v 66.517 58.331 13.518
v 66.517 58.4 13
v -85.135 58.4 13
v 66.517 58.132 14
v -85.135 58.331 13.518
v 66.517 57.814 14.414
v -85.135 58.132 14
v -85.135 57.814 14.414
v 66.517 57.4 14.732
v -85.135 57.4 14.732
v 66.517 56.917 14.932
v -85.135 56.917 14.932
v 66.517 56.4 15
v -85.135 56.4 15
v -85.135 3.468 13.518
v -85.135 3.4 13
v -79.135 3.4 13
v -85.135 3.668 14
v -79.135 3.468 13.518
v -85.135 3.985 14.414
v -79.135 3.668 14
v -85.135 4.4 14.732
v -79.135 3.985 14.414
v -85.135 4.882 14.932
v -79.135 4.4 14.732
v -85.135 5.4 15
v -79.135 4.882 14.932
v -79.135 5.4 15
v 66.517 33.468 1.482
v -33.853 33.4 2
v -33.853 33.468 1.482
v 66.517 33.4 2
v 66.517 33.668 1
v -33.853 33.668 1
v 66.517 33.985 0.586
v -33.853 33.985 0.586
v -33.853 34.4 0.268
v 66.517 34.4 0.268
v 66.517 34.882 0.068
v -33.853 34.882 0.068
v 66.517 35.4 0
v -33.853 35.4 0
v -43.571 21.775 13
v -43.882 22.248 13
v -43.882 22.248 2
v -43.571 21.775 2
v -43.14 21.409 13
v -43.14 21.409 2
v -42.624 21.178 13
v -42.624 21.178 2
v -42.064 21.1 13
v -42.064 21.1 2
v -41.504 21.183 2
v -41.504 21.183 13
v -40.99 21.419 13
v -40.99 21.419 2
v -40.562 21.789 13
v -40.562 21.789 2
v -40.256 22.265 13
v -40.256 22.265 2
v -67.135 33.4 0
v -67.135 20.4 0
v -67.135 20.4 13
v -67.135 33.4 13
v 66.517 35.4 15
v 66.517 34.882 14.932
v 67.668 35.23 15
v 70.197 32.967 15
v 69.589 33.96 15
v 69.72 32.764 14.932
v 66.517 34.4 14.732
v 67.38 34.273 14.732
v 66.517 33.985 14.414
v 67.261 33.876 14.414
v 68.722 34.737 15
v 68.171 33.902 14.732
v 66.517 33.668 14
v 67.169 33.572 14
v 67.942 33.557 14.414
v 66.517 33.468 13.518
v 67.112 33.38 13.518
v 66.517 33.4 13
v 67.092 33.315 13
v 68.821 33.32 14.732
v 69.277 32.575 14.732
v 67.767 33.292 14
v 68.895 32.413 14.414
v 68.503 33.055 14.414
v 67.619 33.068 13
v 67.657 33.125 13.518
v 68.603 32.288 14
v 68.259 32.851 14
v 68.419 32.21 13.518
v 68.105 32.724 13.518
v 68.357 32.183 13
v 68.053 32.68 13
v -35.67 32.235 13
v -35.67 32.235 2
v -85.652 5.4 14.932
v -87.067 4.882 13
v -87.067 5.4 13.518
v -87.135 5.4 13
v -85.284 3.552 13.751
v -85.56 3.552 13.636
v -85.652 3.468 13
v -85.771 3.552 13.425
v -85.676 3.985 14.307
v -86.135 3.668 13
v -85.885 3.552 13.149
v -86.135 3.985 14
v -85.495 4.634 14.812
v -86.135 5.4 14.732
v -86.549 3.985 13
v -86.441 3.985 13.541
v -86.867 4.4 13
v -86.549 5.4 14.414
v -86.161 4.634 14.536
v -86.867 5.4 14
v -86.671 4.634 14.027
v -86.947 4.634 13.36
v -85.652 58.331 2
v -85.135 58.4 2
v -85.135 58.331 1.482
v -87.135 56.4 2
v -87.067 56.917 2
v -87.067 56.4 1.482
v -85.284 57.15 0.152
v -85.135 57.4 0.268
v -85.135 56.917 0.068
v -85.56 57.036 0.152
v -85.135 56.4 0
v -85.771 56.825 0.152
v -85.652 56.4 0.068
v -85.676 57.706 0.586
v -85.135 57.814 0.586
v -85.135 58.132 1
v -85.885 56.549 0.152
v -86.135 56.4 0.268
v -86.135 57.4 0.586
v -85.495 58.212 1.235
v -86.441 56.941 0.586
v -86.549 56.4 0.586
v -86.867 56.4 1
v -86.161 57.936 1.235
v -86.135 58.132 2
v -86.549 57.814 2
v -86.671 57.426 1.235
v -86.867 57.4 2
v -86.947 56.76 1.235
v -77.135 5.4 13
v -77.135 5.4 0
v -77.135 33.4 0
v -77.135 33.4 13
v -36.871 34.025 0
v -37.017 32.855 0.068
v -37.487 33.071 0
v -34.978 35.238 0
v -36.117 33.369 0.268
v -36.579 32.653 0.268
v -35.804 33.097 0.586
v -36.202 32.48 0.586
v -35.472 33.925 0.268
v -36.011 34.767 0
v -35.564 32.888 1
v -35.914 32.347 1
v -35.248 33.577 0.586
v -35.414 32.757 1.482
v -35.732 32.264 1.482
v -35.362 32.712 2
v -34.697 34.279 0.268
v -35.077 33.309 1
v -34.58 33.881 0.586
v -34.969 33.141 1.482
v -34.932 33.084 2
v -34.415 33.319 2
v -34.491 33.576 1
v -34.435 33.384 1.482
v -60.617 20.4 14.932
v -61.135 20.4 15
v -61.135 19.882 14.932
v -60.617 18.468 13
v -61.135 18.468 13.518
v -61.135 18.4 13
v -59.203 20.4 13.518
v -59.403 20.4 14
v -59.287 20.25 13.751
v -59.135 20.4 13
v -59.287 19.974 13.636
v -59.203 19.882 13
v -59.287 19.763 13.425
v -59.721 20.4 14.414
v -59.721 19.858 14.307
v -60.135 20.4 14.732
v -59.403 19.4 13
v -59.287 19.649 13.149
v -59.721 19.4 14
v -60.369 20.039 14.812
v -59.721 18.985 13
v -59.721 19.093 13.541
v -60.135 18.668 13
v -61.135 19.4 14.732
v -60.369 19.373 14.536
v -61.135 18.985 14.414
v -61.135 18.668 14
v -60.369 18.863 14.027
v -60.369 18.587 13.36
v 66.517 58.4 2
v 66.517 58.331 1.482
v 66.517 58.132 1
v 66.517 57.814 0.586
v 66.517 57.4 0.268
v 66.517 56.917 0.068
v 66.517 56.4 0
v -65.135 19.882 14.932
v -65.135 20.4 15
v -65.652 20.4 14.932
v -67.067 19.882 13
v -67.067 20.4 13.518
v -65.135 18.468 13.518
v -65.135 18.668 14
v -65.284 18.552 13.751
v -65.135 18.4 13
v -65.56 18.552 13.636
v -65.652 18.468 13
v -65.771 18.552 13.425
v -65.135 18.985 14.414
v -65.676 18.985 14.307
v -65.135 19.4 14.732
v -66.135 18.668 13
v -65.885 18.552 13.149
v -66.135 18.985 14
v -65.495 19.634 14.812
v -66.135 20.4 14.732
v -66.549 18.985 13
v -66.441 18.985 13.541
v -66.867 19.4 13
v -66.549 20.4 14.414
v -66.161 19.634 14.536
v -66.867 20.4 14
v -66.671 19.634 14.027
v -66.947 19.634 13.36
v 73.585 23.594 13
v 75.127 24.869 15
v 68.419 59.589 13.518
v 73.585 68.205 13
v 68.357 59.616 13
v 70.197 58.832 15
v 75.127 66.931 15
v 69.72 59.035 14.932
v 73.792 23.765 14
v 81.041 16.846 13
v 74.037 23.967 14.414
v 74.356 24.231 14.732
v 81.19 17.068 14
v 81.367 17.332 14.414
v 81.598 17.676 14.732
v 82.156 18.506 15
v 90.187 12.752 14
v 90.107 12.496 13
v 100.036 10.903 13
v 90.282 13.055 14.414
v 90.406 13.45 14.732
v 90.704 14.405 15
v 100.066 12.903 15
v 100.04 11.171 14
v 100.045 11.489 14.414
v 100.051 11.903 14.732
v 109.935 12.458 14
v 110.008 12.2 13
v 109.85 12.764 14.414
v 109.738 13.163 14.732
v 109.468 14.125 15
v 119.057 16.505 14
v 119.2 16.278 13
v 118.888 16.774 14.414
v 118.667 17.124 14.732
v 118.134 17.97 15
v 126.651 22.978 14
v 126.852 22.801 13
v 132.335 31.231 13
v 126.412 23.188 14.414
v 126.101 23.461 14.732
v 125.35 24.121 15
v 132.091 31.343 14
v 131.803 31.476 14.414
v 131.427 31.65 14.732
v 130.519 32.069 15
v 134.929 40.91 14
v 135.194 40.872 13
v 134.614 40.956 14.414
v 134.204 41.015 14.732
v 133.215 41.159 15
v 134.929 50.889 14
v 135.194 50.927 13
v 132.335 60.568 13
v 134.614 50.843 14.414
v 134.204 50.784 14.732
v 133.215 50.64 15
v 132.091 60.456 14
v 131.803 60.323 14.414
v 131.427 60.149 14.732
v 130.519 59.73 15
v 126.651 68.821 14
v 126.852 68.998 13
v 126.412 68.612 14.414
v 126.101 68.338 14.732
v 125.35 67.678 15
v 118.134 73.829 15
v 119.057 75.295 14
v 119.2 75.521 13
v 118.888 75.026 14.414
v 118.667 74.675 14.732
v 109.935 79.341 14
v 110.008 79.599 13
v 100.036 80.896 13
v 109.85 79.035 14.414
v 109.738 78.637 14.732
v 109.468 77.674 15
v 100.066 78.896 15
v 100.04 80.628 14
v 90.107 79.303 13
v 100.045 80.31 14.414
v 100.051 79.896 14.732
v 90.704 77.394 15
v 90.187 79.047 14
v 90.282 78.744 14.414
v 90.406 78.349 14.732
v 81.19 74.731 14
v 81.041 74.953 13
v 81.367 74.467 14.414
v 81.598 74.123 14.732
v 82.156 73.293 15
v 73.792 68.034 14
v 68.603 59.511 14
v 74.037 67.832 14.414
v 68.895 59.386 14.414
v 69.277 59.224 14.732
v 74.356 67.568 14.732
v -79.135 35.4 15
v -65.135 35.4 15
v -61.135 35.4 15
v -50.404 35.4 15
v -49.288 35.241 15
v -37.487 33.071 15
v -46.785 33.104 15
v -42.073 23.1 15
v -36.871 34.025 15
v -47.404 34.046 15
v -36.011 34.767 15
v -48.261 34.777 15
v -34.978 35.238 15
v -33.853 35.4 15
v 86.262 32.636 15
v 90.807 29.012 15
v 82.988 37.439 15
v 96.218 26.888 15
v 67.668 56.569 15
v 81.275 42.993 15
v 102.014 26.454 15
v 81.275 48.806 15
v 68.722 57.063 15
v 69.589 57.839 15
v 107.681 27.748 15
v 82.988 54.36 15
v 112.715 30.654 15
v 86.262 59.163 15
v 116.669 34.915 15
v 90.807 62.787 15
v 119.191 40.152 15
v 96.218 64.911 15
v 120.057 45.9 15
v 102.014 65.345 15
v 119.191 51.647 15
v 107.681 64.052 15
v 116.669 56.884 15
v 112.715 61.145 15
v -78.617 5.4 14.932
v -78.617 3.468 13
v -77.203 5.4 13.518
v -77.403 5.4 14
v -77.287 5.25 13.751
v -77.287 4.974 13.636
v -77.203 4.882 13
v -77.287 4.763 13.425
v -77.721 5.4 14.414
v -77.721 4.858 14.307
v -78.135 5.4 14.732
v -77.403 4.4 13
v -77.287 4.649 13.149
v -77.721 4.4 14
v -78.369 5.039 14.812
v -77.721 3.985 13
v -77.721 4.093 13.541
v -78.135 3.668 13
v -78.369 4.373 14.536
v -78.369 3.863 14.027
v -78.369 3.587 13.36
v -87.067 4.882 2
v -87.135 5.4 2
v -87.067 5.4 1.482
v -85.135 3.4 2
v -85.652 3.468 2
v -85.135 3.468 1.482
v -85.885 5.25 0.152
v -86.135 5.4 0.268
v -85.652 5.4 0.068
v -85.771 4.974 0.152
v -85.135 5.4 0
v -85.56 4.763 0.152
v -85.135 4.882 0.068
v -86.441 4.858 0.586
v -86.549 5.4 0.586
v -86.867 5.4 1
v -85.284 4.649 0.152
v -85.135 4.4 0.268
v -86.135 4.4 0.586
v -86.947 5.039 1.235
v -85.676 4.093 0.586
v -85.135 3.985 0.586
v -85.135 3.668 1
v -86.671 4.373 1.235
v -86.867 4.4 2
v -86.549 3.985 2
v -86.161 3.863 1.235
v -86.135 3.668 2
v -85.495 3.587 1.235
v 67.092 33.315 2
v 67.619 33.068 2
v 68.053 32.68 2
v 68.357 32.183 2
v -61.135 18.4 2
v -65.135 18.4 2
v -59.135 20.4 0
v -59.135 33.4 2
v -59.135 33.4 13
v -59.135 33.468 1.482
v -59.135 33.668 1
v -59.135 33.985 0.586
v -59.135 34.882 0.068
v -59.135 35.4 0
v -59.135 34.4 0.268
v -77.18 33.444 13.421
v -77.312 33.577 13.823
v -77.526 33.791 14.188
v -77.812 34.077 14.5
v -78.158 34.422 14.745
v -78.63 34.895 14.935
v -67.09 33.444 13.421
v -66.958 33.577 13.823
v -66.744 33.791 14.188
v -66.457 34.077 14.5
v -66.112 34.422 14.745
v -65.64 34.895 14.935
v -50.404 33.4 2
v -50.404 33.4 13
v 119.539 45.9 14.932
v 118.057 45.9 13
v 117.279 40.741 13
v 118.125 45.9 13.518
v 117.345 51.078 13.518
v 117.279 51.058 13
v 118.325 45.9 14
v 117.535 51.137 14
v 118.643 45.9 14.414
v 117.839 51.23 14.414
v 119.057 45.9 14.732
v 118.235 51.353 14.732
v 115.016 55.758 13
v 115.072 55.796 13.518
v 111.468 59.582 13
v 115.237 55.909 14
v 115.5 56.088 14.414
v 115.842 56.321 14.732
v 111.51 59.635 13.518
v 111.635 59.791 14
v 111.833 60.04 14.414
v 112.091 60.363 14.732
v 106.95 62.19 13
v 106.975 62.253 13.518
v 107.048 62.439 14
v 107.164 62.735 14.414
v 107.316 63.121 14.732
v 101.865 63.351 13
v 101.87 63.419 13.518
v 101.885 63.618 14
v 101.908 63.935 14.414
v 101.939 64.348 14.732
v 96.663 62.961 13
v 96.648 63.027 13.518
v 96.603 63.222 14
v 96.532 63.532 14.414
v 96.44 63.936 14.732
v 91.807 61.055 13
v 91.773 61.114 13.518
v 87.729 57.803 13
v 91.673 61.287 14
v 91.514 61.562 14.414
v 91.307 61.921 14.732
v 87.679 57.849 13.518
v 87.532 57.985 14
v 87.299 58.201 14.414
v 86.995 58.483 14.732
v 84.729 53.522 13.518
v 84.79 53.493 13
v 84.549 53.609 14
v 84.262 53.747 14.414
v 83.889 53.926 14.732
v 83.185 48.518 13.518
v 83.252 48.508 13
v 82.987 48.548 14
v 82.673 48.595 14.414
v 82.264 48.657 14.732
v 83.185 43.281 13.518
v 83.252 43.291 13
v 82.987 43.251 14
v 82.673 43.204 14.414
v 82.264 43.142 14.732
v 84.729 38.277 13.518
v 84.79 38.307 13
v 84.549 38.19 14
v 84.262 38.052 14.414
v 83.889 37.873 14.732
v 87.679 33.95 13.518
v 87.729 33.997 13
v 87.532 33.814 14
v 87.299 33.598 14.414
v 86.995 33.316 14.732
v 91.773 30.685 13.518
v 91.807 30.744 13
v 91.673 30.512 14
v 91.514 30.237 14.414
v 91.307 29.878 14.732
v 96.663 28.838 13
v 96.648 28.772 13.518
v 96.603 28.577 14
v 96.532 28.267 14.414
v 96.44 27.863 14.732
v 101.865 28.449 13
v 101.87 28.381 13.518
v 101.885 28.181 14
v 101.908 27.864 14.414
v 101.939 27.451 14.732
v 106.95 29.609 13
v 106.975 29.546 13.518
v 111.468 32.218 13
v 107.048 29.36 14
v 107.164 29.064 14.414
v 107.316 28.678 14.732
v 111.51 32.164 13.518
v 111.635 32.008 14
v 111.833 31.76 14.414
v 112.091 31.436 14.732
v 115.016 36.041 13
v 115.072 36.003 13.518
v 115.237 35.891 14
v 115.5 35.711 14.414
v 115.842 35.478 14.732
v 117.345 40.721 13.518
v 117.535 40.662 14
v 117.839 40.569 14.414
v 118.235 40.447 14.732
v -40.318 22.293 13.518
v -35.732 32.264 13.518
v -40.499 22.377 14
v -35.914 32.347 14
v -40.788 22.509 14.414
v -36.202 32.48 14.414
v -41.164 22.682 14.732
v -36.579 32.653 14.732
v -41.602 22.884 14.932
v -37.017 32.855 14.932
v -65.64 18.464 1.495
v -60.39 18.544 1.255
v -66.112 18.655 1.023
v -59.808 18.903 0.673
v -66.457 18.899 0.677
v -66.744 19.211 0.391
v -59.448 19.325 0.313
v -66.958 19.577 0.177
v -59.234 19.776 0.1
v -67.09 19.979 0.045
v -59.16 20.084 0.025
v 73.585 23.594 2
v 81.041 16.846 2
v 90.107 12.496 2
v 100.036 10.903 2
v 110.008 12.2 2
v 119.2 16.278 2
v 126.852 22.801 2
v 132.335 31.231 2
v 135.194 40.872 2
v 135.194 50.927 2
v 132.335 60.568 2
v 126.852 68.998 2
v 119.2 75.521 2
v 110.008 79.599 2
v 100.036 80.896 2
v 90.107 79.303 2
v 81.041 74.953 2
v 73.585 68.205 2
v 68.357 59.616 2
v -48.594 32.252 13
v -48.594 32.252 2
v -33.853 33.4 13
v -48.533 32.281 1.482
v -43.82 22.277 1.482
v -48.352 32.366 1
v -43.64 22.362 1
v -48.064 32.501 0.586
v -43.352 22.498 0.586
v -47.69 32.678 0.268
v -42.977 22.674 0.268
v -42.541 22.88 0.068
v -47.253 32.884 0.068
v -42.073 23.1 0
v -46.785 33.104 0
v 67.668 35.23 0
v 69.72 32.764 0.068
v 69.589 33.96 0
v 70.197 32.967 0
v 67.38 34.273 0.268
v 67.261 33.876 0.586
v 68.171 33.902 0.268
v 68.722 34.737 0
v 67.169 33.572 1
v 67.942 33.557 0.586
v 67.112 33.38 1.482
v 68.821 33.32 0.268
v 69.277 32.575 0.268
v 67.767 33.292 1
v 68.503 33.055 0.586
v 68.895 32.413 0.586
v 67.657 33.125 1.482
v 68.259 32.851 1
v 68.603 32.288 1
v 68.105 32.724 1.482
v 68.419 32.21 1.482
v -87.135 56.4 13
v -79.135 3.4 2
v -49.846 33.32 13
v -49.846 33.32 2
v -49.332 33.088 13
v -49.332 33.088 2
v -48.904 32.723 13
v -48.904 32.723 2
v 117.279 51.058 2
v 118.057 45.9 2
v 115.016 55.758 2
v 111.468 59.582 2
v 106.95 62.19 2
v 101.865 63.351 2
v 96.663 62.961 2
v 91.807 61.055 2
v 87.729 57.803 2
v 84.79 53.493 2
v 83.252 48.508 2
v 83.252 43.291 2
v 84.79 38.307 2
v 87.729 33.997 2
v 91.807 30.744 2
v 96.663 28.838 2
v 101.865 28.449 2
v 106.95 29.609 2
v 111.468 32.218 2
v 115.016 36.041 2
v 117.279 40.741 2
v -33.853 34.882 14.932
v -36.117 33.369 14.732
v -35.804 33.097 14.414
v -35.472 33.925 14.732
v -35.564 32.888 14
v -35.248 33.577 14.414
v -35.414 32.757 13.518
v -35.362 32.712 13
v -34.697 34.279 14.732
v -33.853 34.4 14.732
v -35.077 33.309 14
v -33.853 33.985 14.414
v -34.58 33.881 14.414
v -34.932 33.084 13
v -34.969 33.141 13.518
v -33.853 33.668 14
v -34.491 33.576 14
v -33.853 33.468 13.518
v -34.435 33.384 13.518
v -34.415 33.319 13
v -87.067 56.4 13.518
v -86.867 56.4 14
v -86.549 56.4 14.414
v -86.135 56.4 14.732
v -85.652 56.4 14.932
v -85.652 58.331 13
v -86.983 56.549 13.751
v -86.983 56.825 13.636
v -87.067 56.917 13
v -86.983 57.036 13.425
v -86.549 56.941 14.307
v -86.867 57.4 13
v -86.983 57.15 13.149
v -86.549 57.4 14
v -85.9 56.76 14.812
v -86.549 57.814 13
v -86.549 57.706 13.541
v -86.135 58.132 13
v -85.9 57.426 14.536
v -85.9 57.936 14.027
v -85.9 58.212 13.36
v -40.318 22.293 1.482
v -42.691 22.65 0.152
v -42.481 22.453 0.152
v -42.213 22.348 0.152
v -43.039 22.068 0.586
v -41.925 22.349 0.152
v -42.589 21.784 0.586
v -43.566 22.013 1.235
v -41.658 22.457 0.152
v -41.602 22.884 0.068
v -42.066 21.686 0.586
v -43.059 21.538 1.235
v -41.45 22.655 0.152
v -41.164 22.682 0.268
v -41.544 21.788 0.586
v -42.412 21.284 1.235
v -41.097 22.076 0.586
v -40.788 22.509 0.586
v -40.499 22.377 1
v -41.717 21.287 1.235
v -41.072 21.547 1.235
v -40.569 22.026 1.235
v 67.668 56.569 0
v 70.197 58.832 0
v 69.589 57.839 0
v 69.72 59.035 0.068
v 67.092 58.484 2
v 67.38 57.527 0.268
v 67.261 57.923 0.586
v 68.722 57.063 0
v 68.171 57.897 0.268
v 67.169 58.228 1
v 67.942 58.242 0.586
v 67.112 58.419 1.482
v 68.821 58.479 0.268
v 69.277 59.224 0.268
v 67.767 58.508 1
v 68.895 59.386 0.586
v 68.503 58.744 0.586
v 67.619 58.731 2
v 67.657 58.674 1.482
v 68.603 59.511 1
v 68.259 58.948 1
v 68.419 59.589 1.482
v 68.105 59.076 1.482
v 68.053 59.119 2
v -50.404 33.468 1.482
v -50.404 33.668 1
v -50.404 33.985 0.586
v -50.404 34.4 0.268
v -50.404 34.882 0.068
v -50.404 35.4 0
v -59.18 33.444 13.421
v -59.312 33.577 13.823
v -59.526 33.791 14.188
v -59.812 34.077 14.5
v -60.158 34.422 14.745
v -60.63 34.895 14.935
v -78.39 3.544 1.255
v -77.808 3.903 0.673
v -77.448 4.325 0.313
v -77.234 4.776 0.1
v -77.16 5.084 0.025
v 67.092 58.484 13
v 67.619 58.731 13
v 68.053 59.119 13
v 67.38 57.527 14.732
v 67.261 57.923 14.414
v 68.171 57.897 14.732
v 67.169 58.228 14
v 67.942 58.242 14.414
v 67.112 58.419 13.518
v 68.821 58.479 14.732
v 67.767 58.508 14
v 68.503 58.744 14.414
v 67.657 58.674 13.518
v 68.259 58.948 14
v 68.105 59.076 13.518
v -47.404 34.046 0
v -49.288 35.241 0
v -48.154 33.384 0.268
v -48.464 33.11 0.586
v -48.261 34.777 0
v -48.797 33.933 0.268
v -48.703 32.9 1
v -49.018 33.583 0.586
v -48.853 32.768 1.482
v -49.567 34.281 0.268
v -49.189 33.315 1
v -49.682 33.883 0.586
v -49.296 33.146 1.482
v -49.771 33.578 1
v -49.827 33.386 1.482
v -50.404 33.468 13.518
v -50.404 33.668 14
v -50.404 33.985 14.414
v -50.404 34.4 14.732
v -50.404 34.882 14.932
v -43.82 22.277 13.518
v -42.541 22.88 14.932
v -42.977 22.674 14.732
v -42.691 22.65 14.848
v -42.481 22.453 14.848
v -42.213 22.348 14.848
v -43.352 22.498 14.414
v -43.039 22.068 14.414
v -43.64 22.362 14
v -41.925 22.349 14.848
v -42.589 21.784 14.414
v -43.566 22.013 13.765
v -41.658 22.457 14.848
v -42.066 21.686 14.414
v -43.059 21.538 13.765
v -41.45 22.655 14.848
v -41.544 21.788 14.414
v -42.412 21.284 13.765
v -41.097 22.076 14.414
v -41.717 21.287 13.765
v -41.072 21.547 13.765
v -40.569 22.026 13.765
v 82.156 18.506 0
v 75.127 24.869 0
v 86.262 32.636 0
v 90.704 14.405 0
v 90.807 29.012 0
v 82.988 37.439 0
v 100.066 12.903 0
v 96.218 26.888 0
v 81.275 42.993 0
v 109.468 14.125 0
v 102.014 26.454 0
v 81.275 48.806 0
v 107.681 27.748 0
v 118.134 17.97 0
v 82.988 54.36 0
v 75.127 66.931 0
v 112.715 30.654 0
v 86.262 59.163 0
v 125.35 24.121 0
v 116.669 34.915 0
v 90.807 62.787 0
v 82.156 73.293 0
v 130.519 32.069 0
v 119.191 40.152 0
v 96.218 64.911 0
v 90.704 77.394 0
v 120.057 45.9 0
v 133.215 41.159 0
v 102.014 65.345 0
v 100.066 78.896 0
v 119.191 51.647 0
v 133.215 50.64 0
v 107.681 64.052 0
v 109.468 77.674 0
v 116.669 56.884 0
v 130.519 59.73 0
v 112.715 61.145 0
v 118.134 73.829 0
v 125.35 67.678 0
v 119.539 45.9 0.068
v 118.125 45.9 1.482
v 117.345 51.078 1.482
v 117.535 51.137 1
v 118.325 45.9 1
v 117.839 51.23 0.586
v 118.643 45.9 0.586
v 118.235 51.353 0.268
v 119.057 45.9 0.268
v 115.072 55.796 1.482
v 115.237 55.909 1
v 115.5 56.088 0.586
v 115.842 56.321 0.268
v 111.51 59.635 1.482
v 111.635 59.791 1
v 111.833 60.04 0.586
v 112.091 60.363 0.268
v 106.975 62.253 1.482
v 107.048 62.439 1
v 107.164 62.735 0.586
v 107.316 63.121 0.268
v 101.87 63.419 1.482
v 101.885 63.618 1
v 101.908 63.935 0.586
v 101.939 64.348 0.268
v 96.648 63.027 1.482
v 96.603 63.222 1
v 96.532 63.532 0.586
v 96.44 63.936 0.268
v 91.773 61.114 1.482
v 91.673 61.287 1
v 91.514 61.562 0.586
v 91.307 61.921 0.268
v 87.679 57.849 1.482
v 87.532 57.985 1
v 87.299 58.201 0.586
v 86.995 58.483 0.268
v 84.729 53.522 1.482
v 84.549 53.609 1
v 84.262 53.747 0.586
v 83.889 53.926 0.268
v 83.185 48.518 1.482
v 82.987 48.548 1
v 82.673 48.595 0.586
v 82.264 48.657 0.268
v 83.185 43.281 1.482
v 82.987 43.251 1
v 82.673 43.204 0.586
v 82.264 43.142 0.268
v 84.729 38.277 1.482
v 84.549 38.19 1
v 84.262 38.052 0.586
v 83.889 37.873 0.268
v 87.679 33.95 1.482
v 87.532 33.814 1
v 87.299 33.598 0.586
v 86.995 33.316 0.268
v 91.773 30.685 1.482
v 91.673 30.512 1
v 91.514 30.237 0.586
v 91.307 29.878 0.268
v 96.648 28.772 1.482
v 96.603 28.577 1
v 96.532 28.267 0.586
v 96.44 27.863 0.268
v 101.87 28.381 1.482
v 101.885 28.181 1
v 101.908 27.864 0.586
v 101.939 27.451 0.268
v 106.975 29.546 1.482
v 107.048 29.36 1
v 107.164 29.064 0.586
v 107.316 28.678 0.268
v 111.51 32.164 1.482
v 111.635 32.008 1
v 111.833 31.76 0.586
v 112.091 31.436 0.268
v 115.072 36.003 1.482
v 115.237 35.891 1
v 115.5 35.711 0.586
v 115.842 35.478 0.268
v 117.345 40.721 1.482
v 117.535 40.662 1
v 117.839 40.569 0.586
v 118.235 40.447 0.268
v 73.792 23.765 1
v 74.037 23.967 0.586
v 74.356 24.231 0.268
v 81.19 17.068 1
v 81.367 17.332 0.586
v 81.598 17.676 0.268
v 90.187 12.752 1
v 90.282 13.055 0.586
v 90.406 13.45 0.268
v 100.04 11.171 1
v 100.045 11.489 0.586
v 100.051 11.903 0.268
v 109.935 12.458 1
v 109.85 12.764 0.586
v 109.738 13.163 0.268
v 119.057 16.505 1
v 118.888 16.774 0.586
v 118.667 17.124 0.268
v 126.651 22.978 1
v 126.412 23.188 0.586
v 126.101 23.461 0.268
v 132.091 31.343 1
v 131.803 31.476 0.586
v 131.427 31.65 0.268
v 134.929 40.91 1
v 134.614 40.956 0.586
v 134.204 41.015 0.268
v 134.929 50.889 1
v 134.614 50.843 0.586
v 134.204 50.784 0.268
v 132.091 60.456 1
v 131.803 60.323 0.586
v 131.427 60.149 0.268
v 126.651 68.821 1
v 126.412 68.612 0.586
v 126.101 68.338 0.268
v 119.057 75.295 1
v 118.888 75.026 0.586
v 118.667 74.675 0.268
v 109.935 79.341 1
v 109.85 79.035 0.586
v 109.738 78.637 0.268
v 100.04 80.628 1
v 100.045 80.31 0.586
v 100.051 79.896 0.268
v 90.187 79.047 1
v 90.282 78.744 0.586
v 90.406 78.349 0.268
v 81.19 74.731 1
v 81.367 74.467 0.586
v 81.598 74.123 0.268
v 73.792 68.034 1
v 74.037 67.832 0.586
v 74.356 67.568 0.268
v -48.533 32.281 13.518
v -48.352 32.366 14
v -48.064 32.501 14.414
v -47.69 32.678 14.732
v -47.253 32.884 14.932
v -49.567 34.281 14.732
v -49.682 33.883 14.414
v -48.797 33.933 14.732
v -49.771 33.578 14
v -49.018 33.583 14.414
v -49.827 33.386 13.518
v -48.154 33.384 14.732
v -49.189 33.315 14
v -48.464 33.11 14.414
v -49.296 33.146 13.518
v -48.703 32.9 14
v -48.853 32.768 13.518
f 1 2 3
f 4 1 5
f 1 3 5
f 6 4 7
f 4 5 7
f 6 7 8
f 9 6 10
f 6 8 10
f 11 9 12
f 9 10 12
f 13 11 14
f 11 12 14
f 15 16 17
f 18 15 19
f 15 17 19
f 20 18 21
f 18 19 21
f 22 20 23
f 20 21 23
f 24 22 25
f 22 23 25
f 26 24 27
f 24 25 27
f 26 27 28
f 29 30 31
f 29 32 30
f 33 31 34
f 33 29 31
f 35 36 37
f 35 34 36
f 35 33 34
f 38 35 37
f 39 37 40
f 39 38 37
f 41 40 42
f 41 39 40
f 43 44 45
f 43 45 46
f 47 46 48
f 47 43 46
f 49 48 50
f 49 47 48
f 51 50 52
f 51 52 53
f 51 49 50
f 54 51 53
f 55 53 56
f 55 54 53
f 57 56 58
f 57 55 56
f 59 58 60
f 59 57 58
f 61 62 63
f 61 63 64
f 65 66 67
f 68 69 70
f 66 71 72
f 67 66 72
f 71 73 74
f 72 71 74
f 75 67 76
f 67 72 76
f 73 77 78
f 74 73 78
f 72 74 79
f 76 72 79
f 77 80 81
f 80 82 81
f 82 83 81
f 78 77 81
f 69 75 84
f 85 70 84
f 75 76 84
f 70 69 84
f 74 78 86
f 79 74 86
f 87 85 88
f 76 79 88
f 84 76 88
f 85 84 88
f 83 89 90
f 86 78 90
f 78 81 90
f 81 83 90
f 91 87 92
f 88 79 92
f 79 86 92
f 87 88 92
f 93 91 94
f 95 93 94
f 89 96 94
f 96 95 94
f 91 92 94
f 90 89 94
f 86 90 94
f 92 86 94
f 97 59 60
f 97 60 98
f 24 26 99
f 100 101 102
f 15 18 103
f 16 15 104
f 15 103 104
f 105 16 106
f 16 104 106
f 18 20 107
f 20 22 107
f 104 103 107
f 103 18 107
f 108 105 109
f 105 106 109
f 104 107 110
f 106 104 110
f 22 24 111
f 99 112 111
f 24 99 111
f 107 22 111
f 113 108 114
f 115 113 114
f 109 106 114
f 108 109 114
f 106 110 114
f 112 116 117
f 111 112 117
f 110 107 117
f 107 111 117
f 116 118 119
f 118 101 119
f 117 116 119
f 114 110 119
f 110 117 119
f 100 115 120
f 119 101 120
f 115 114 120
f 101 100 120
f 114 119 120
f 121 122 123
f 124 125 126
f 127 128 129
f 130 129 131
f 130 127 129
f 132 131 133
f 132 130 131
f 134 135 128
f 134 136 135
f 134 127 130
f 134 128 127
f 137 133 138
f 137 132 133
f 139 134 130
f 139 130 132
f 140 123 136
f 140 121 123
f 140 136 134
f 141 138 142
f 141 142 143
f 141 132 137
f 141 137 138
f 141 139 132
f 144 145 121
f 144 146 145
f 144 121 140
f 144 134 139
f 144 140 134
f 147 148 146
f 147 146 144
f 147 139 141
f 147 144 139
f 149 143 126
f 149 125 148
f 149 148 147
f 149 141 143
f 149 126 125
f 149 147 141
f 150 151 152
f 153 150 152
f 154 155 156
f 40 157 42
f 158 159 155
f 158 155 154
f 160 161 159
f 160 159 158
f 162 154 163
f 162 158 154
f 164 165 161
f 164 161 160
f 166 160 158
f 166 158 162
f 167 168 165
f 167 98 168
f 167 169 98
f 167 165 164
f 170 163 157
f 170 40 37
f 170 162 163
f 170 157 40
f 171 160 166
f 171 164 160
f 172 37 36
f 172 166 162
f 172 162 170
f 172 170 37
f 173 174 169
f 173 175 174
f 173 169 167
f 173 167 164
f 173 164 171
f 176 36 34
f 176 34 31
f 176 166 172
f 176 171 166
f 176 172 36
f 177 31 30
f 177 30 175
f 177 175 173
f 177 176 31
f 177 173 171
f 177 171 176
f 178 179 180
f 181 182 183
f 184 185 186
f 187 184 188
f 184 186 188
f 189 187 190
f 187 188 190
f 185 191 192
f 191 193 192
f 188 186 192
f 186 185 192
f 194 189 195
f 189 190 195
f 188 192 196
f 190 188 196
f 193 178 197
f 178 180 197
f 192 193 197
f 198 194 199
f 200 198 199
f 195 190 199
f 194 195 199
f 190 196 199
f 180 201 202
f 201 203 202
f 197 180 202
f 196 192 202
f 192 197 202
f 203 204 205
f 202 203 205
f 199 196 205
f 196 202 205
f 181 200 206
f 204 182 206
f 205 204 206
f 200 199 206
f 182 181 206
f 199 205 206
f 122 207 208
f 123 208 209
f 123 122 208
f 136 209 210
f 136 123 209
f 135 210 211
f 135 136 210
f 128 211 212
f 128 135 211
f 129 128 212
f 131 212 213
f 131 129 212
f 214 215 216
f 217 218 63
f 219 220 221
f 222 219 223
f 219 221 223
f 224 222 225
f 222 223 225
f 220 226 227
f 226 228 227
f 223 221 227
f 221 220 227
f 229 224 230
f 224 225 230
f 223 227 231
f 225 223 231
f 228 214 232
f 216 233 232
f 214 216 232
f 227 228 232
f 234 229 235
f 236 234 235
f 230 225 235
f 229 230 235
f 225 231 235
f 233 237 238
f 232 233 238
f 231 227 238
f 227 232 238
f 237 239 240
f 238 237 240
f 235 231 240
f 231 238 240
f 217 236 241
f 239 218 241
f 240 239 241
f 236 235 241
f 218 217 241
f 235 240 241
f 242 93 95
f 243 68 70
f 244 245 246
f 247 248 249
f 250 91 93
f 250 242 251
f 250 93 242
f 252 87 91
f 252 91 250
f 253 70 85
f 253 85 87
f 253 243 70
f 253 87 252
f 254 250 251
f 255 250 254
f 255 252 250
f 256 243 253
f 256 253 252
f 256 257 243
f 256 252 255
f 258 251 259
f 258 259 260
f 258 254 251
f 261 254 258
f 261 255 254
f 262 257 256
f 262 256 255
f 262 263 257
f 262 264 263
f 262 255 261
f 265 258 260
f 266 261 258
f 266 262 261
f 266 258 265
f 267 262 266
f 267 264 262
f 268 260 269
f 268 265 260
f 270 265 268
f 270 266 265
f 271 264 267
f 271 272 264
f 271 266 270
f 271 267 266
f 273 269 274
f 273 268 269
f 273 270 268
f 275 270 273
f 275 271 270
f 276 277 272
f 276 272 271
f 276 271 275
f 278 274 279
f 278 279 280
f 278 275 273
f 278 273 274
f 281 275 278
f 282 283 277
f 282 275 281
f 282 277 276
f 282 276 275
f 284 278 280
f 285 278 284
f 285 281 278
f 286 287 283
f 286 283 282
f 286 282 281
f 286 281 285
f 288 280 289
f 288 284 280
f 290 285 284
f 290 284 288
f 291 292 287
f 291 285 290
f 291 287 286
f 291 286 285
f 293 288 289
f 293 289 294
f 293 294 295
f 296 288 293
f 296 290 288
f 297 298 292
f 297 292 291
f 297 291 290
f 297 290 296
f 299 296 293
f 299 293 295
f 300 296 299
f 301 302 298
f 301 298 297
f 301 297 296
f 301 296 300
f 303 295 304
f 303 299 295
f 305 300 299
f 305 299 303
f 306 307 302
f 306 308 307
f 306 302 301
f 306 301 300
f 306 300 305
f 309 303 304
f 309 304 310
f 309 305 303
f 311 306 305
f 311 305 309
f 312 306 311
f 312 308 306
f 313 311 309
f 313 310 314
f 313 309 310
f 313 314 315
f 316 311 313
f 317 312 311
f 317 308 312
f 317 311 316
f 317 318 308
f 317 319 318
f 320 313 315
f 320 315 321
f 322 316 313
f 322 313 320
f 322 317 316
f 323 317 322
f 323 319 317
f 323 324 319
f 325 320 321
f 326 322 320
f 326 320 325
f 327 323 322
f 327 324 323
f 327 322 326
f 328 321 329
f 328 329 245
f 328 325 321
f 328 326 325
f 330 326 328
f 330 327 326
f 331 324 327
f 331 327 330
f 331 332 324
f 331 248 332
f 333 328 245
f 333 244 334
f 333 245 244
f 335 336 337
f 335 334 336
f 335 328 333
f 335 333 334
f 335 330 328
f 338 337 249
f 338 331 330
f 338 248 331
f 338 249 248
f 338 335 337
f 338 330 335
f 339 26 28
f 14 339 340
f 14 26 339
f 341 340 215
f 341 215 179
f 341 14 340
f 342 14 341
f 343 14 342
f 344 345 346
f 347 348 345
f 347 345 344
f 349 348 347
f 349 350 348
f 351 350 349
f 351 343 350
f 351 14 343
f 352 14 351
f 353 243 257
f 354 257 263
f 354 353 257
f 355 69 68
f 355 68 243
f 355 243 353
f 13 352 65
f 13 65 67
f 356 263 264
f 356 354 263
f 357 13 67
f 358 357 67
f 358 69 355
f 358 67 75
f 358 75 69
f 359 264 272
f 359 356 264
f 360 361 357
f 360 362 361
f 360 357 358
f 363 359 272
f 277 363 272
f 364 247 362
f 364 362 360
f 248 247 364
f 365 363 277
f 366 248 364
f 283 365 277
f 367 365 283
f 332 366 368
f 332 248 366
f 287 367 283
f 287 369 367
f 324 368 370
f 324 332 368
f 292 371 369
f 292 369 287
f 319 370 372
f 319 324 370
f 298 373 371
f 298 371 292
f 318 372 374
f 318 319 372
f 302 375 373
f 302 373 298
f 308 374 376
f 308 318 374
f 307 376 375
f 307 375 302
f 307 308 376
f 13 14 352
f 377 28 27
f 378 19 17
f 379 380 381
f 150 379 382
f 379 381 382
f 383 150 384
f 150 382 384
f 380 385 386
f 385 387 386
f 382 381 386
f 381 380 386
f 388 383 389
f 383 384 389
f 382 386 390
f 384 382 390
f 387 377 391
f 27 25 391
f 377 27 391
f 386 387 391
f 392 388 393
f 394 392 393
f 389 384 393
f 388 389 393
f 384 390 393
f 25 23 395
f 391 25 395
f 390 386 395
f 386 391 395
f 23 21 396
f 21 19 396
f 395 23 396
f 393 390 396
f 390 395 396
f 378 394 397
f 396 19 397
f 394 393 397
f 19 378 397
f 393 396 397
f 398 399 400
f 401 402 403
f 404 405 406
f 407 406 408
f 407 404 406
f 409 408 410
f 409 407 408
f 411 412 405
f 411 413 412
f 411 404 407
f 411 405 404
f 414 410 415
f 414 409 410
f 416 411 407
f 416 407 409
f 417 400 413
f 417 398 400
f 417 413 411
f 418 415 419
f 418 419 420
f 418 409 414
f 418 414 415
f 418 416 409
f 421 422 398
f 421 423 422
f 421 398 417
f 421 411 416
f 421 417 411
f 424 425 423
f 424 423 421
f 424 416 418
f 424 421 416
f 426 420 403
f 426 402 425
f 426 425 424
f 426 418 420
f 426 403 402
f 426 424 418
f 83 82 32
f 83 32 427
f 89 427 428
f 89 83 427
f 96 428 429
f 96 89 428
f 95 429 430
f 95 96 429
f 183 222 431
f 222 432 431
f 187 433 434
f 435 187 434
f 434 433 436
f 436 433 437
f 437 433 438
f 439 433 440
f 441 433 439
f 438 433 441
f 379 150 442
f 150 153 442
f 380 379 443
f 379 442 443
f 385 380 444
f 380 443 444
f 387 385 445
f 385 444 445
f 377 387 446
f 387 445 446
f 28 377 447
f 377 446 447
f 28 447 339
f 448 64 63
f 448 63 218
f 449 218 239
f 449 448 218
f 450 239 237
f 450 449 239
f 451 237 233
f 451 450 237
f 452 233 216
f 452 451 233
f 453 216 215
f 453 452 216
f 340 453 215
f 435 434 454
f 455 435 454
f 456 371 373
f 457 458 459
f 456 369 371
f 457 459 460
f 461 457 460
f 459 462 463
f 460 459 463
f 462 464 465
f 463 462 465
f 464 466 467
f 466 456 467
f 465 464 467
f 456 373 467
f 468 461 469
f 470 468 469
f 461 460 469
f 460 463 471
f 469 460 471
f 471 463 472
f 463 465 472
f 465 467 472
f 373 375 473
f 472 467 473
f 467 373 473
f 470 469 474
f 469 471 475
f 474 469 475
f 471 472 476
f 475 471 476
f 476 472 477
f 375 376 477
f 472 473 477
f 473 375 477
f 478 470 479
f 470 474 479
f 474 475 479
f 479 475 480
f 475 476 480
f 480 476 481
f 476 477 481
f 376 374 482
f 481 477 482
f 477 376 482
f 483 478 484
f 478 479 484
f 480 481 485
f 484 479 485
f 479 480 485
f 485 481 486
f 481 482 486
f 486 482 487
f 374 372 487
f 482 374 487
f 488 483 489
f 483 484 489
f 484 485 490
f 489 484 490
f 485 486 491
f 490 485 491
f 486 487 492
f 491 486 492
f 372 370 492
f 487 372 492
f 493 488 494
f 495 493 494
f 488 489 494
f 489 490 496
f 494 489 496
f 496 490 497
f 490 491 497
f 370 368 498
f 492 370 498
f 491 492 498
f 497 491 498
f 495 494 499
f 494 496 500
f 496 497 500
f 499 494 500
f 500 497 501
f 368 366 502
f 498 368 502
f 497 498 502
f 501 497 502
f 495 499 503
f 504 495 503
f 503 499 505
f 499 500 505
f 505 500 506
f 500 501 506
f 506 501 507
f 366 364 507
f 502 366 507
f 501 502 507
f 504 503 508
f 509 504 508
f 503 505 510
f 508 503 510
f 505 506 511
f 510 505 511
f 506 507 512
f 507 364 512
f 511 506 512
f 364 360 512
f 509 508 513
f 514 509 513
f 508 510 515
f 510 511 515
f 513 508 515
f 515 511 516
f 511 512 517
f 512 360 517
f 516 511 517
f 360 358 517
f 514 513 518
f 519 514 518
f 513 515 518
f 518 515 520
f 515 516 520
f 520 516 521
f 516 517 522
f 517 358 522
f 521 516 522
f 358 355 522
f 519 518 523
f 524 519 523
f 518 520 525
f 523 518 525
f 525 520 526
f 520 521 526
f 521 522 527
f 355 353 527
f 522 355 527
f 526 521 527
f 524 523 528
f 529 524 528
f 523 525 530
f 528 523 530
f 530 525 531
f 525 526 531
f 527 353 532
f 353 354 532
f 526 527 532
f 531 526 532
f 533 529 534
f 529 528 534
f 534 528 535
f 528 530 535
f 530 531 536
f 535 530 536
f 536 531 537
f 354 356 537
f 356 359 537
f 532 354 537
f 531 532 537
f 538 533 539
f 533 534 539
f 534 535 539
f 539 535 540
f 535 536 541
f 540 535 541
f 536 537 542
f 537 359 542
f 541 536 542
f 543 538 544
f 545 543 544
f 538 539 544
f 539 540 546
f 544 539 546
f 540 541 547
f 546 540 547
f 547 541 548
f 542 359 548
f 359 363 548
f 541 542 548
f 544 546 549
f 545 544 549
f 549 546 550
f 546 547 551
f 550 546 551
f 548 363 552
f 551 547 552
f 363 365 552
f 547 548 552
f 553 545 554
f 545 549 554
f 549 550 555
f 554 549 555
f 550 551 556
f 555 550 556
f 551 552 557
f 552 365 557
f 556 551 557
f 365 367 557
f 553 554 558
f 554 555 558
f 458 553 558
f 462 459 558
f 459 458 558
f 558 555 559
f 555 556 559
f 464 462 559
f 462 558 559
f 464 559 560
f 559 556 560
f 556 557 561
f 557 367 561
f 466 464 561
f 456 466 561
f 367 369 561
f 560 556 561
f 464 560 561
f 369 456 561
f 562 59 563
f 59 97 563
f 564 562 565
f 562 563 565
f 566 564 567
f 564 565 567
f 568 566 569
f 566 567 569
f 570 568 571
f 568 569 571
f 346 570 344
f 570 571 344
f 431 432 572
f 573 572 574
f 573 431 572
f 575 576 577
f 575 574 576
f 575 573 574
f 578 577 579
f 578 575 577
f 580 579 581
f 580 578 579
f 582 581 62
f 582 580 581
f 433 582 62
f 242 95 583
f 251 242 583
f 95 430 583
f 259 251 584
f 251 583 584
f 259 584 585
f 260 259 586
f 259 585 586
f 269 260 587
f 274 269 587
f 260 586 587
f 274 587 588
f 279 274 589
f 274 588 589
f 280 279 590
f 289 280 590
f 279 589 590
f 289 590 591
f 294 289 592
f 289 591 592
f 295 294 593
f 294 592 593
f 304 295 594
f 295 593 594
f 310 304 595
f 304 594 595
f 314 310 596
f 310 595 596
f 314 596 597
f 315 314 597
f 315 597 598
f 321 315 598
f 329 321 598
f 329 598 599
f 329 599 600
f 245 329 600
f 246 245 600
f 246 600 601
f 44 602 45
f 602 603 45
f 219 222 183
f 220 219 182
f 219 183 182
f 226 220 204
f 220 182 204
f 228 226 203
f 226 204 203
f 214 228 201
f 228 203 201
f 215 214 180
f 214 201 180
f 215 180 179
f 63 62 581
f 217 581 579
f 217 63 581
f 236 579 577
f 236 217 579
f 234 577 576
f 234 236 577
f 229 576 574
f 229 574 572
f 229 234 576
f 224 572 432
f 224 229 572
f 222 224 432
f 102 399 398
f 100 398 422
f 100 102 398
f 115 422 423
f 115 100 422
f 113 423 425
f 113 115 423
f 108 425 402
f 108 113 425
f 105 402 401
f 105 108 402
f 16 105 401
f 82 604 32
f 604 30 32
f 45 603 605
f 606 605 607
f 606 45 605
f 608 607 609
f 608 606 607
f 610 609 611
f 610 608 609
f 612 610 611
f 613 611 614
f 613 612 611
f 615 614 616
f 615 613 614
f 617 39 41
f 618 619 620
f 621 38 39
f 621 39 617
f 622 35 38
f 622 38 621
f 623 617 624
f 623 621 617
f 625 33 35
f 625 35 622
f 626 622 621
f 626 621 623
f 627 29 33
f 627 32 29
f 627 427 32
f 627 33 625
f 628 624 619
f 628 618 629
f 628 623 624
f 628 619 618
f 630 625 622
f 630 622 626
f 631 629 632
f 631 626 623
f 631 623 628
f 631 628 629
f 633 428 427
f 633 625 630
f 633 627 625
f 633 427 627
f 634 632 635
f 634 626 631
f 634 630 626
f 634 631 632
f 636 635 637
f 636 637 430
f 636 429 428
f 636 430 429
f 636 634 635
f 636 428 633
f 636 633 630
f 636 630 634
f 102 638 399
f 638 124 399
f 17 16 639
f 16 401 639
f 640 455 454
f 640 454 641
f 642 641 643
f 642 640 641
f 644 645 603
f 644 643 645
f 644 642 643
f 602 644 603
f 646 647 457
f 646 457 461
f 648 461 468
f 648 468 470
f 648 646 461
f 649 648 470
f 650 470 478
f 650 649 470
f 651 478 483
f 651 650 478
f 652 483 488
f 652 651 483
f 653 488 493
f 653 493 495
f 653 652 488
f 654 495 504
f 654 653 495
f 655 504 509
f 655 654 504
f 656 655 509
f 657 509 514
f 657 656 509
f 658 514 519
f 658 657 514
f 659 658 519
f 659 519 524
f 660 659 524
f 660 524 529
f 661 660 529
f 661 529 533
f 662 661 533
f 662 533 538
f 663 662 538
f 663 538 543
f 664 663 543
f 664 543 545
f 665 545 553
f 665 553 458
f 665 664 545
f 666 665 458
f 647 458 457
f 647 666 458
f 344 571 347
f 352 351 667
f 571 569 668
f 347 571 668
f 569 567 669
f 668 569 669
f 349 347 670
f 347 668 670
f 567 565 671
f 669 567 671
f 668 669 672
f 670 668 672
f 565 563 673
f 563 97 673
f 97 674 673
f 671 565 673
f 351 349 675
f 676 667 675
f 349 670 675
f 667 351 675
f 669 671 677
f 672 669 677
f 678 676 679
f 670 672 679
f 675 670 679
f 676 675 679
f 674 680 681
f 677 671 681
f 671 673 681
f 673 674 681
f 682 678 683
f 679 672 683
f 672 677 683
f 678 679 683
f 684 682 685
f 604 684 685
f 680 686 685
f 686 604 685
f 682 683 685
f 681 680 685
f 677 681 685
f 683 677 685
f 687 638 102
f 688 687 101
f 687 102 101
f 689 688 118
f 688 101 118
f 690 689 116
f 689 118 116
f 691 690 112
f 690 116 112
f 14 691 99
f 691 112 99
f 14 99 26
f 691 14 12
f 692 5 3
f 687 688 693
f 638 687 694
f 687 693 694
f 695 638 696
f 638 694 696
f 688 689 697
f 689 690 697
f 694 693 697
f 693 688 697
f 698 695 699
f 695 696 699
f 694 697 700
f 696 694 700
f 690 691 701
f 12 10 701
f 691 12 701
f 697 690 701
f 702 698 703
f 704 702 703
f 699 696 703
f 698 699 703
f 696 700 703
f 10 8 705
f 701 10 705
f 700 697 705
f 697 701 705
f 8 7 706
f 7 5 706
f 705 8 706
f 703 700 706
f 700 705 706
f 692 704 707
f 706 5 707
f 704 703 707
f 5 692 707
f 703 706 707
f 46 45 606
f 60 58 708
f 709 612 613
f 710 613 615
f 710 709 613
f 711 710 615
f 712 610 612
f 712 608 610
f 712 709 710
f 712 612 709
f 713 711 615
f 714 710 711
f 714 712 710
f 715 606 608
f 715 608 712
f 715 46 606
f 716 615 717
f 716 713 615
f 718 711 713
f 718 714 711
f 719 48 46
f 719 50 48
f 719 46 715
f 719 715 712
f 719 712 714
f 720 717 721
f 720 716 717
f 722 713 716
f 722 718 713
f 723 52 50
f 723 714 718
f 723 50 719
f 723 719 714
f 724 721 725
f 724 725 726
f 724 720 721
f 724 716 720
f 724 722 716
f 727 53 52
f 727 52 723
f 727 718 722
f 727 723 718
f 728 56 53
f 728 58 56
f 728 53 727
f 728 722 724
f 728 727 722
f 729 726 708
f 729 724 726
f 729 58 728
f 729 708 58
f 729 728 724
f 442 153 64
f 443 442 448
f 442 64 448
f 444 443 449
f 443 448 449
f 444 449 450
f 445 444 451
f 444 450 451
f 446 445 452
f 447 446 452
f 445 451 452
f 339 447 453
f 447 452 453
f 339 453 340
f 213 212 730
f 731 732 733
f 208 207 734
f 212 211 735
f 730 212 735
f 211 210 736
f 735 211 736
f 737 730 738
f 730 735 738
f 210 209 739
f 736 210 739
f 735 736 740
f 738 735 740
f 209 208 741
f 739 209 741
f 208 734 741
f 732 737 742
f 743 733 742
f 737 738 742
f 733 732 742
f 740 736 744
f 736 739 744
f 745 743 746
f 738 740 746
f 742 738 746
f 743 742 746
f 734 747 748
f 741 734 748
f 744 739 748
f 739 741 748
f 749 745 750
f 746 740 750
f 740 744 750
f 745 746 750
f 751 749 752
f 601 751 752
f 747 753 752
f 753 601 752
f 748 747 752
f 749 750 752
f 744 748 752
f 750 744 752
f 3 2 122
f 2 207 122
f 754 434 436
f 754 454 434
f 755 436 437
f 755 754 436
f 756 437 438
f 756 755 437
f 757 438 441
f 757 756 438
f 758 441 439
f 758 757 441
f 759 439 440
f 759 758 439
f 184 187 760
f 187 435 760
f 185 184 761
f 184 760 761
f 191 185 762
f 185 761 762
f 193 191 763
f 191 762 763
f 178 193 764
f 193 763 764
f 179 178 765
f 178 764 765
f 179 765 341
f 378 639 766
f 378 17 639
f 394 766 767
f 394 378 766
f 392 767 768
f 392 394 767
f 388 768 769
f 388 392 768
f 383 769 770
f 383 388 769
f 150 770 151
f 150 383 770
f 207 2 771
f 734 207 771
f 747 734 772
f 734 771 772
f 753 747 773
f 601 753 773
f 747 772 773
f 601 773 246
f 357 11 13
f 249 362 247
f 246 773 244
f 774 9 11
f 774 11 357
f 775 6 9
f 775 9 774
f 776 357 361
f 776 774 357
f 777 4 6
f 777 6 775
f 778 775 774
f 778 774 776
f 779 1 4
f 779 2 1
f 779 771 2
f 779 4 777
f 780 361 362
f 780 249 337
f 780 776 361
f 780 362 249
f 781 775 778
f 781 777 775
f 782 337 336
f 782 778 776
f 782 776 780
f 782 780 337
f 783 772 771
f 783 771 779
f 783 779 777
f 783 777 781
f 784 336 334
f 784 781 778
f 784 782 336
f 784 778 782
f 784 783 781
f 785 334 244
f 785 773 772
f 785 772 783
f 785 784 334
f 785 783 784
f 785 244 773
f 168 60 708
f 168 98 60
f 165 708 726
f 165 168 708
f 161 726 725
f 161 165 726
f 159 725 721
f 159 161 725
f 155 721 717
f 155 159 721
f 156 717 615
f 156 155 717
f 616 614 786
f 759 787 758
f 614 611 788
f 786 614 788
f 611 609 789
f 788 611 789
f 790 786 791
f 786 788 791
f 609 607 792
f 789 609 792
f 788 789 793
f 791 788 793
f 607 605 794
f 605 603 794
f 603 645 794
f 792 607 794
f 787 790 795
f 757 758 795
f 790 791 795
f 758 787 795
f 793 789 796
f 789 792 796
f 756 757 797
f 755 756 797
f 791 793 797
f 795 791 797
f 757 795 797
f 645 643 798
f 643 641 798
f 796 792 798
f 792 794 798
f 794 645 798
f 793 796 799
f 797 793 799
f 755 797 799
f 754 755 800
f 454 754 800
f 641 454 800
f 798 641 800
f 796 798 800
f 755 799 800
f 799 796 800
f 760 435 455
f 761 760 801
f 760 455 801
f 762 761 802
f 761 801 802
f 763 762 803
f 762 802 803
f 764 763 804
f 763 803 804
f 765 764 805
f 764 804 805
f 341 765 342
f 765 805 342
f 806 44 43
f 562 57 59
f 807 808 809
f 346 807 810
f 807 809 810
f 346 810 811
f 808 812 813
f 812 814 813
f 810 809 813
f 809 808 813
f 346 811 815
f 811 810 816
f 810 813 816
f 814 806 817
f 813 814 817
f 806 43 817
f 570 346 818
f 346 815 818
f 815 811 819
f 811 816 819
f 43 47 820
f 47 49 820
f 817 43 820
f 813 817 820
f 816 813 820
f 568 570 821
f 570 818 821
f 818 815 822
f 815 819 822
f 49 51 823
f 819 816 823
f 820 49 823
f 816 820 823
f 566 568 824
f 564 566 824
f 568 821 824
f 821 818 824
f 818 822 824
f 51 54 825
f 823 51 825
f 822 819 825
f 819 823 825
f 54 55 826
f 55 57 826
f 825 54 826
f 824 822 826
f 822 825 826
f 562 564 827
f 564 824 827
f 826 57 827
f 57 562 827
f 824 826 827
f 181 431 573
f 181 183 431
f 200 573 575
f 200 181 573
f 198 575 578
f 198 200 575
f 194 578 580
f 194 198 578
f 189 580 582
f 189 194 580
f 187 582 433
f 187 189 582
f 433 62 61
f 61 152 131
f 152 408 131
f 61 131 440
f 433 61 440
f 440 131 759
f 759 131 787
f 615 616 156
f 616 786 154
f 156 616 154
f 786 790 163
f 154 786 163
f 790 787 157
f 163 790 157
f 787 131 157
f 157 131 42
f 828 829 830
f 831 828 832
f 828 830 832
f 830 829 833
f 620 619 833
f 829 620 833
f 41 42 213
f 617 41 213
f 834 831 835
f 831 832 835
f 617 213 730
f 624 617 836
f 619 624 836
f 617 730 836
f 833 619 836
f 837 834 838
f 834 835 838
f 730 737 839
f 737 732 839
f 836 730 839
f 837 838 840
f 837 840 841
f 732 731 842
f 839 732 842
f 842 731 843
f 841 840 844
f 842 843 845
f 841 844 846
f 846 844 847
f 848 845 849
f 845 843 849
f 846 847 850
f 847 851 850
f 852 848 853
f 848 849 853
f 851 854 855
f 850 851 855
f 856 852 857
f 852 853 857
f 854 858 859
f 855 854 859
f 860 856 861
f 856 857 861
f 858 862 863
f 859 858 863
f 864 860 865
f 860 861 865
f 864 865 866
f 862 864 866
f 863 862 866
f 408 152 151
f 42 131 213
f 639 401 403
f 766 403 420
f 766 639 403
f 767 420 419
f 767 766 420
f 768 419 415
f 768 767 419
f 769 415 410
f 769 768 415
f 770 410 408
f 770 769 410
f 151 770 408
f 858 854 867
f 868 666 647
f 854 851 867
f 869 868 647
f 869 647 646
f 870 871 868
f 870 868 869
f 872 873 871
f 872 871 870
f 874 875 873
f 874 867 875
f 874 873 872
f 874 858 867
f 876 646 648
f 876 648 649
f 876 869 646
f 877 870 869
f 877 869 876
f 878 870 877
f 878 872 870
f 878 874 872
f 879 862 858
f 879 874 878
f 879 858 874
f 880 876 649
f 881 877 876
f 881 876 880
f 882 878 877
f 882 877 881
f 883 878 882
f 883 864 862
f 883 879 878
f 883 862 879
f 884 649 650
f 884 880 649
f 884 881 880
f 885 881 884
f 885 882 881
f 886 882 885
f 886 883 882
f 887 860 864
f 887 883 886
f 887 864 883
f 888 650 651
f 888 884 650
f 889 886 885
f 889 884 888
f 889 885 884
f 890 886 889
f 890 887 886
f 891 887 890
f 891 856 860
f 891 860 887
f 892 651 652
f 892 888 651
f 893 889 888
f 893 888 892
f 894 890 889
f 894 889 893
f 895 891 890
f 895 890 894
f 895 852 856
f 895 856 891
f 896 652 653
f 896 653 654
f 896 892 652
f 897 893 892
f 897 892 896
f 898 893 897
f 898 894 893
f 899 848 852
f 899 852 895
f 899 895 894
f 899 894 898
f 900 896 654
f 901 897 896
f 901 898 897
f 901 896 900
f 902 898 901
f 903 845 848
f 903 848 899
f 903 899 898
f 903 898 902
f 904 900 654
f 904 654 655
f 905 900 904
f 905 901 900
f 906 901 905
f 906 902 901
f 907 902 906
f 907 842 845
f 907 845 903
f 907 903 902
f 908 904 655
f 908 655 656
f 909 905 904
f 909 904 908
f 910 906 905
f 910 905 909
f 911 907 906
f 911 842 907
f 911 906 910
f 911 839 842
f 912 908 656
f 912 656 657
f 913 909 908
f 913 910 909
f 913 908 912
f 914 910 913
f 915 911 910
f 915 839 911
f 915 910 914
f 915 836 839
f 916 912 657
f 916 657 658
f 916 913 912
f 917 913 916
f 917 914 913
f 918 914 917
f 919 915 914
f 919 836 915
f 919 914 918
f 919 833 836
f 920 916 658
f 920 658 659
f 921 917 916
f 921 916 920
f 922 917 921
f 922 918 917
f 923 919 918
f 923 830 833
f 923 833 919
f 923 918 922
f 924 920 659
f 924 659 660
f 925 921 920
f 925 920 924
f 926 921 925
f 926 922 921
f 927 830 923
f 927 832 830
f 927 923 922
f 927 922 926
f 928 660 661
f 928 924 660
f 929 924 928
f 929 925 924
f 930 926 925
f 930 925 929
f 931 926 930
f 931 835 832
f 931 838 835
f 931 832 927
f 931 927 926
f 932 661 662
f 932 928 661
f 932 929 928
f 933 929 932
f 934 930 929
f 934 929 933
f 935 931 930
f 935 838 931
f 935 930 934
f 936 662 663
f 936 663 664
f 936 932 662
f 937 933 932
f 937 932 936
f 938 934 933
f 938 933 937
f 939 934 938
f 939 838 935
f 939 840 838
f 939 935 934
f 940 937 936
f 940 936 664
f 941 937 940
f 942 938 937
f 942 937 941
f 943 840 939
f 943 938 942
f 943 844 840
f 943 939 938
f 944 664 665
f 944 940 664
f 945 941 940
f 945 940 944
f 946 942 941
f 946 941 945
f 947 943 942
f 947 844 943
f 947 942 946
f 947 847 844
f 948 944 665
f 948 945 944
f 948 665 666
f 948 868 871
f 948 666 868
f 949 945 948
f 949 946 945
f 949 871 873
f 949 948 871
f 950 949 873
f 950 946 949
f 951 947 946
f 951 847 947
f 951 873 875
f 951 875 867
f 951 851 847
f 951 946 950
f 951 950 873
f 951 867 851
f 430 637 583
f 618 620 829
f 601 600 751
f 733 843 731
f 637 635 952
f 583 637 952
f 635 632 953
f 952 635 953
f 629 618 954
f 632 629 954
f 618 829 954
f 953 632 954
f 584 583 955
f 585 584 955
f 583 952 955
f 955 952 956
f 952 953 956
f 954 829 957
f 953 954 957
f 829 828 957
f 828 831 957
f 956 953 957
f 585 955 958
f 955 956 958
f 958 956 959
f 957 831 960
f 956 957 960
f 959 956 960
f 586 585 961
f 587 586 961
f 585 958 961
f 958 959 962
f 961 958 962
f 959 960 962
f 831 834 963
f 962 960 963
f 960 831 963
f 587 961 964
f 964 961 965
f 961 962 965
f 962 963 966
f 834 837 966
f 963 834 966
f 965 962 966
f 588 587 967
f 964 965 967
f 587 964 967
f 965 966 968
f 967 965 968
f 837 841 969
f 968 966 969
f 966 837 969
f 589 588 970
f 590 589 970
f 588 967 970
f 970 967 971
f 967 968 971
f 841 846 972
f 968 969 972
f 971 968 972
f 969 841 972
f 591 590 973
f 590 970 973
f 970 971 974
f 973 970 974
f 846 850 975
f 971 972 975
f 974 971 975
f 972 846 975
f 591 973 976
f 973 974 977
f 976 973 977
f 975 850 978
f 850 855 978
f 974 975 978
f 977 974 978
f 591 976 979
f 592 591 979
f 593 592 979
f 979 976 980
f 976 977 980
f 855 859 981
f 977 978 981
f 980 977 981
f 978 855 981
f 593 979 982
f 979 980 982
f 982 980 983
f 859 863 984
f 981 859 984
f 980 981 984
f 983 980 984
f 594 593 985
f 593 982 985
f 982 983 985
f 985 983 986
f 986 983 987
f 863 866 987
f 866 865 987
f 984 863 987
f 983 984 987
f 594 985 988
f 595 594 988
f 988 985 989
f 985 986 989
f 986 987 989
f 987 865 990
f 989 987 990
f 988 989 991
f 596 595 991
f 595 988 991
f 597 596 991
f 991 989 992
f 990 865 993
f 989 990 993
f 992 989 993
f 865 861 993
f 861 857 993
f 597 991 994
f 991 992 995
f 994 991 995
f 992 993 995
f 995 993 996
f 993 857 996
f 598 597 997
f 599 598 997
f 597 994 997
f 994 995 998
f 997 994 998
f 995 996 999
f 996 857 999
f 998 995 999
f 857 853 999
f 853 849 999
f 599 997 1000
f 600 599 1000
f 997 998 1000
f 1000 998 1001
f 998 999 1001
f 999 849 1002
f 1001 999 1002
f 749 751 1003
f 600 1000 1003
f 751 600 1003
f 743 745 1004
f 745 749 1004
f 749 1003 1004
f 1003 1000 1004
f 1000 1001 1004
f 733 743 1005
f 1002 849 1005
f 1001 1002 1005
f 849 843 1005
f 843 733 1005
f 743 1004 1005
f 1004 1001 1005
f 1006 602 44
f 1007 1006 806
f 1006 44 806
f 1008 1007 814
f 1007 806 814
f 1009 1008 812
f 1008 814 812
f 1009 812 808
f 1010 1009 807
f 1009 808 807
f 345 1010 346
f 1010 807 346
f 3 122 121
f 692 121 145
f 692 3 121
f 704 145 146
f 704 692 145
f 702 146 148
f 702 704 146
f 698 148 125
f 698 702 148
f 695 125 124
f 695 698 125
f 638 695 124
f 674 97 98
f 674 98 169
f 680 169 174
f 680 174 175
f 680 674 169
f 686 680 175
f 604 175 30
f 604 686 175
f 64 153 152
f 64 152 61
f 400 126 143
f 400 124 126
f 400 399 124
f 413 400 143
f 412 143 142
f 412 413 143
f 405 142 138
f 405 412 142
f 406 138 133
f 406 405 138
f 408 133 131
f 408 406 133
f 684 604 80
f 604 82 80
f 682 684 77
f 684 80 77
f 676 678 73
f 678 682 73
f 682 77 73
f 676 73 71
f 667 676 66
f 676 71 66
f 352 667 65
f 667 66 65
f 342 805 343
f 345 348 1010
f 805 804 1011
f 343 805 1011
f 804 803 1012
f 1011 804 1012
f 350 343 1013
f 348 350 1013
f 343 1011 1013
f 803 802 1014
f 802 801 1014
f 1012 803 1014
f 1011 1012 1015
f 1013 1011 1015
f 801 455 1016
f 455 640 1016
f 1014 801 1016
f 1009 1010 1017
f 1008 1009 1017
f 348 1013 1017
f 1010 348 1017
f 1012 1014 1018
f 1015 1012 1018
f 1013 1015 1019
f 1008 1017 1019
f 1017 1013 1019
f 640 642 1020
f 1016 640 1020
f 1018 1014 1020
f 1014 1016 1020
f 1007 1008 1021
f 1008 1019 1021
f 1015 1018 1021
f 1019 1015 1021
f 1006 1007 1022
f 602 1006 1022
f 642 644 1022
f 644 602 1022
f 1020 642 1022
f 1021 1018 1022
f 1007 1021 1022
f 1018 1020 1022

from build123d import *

# Parameters (mm, degrees)
F0_R     = 17.5
F0_W     = 8
F0_H     = 15
F0_W_2   = 10
F0_H_2   = 30
F1_DEPTH = 15
F2_R     = 2


with BuildPart() as f1:
    # F0 (on Top) → F1 (new body)
    with BuildSketch(Plane.XY):
        with BuildLine():
            Line((67.8651795072, 58.3995857492), (-87.1348204928, 58.3995857492))
            Line((-87.1348204928, 58.3995857492), (-87.1348204928, 33.3995857492))
            Line((-87.1348204928, 33.3995857492), (-77.1348204928, 33.3995857492))
            Line((-77.1348204928, 33.3995857492), (-67.1348204928, 33.3995857492))
            Line((-67.1348204928, 33.3995857492), (-59.1348204928, 33.3995857492))
            Line((-59.1348204928, 33.3995857492), (-49.1348204928, 33.3995857492))
            Line((-49.1348204928, 33.3995857492), (-35.1348204928, 33.3995857492))
            Line((-35.1348204928, 33.3995857492), (67.8651795072, 33.3995857492))
            ThreePointArc((67.8651795072, 33.3995857492), (135.5569215837, 45.8995857492), (67.8651795072, 58.3995857492))
        make_face()
        with Locations((100.5569215837, 45.8995857492)):
            Circle(F0_R, mode=Mode.SUBTRACT)
        with Locations((-63.1348204928, 25.8995857492)):
            Rectangle(F0_W, F0_H)
        Polygon((-42.0509860516, 18.3606874198), (-35.1348204928, 33.3995857492), (-49.1348204928, 33.3995857492), align=None)
        with Locations((-82.1348204928, 18.3995857492)):
            Rectangle(F0_W_2, F0_H_2)
    extrude(amount=F1_DEPTH)

    # F2
    f2_edges = [f1.edges().sort_by_distance(p)[0] for p in [
        (-54.13482, 33.399586, 15),
        (-9.63482, 58.399586, 15),
        (-87.13482, 30.899586, 15),
        (-82.13482, 3.399586, 15),
        (-77.13482, 18.399586, 15),
        (-72.13482, 33.399586, 15),
        (-67.13482, 25.899586, 15),
        (-63.13482, 18.399586, 15),
        (-59.13482, 25.899586, 15),
        (-45.592903, 25.880137, 15),
        (-38.592903, 25.880137, 15),
        (16.36518, 33.399586, 15),
        (135.556922, 45.899586, 15),
        (83.056922, 45.899586, 15),
        (135.556922, 45.899586, 0),
        (67.86518, 33.399586, 7.5),
        (67.86518, 58.399586, 7.5),
        (-87.13482, 58.399586, 7.5),
        (-9.63482, 58.399586, 0),
        (-87.13482, 3.399586, 7.5),
        (-87.13482, 30.899586, 0),
        (-77.13482, 3.399586, 7.5),
        (-59.13482, 18.399586, 7.5),
        (-49.13482, 33.399586, 7.5),
        (-42.050986, 18.360687, 7.5),
        (-45.592903, 25.880137, 0),
        (-35.13482, 33.399586, 7.5),
        (-82.13482, 3.399586, 0),
        (-67.13482, 18.399586, 7.5),
        (83.056922, 45.899586, 0),
        (-63.13482, 18.399586, 0),
        (-38.592903, 25.880137, 0),
        (16.36518, 33.399586, 0),
        (-54.13482, 33.399586, 0),
    ]]
    fillet(f2_edges, radius=F2_R)


solid = f1.part
